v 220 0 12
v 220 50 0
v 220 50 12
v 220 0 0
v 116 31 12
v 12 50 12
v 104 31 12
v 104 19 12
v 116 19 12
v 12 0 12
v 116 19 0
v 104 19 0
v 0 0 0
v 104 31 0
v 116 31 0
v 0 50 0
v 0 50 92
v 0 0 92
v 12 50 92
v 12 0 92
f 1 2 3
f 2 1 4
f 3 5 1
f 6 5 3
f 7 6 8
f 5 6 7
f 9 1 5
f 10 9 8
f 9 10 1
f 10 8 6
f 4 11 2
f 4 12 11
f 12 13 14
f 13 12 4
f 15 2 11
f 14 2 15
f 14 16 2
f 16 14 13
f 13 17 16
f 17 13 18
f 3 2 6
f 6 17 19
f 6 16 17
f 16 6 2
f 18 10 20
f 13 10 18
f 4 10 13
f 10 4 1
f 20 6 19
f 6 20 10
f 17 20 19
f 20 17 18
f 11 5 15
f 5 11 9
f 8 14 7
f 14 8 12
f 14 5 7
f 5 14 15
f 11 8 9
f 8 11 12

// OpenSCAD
$fn = 32;

// ----------------------------------------------------------------------
// Gantry bracket: 200-250 mm L bracket
// ----------------------------------------------------------------------

// --- parameters (mm) ---
base_l = 220;             // base arm length, X
arm_w = 50;               // arm width, Y
thick = 12;               // arm thickness
up_h = 80;                // vertical arm height, Z
slot_w = 12;              // adjustment slot width in the base

total_h = up_h + thick;  // overall height

difference() {
  union() {
    cube([base_l, arm_w, thick]);
    cube([thick, arm_w, total_h]);
  }
  translate([base_l / 2 - slot_w / 2, arm_w / 2 - slot_w / 2, -1])
    cube([slot_w, slot_w, thick + 2]);
}
